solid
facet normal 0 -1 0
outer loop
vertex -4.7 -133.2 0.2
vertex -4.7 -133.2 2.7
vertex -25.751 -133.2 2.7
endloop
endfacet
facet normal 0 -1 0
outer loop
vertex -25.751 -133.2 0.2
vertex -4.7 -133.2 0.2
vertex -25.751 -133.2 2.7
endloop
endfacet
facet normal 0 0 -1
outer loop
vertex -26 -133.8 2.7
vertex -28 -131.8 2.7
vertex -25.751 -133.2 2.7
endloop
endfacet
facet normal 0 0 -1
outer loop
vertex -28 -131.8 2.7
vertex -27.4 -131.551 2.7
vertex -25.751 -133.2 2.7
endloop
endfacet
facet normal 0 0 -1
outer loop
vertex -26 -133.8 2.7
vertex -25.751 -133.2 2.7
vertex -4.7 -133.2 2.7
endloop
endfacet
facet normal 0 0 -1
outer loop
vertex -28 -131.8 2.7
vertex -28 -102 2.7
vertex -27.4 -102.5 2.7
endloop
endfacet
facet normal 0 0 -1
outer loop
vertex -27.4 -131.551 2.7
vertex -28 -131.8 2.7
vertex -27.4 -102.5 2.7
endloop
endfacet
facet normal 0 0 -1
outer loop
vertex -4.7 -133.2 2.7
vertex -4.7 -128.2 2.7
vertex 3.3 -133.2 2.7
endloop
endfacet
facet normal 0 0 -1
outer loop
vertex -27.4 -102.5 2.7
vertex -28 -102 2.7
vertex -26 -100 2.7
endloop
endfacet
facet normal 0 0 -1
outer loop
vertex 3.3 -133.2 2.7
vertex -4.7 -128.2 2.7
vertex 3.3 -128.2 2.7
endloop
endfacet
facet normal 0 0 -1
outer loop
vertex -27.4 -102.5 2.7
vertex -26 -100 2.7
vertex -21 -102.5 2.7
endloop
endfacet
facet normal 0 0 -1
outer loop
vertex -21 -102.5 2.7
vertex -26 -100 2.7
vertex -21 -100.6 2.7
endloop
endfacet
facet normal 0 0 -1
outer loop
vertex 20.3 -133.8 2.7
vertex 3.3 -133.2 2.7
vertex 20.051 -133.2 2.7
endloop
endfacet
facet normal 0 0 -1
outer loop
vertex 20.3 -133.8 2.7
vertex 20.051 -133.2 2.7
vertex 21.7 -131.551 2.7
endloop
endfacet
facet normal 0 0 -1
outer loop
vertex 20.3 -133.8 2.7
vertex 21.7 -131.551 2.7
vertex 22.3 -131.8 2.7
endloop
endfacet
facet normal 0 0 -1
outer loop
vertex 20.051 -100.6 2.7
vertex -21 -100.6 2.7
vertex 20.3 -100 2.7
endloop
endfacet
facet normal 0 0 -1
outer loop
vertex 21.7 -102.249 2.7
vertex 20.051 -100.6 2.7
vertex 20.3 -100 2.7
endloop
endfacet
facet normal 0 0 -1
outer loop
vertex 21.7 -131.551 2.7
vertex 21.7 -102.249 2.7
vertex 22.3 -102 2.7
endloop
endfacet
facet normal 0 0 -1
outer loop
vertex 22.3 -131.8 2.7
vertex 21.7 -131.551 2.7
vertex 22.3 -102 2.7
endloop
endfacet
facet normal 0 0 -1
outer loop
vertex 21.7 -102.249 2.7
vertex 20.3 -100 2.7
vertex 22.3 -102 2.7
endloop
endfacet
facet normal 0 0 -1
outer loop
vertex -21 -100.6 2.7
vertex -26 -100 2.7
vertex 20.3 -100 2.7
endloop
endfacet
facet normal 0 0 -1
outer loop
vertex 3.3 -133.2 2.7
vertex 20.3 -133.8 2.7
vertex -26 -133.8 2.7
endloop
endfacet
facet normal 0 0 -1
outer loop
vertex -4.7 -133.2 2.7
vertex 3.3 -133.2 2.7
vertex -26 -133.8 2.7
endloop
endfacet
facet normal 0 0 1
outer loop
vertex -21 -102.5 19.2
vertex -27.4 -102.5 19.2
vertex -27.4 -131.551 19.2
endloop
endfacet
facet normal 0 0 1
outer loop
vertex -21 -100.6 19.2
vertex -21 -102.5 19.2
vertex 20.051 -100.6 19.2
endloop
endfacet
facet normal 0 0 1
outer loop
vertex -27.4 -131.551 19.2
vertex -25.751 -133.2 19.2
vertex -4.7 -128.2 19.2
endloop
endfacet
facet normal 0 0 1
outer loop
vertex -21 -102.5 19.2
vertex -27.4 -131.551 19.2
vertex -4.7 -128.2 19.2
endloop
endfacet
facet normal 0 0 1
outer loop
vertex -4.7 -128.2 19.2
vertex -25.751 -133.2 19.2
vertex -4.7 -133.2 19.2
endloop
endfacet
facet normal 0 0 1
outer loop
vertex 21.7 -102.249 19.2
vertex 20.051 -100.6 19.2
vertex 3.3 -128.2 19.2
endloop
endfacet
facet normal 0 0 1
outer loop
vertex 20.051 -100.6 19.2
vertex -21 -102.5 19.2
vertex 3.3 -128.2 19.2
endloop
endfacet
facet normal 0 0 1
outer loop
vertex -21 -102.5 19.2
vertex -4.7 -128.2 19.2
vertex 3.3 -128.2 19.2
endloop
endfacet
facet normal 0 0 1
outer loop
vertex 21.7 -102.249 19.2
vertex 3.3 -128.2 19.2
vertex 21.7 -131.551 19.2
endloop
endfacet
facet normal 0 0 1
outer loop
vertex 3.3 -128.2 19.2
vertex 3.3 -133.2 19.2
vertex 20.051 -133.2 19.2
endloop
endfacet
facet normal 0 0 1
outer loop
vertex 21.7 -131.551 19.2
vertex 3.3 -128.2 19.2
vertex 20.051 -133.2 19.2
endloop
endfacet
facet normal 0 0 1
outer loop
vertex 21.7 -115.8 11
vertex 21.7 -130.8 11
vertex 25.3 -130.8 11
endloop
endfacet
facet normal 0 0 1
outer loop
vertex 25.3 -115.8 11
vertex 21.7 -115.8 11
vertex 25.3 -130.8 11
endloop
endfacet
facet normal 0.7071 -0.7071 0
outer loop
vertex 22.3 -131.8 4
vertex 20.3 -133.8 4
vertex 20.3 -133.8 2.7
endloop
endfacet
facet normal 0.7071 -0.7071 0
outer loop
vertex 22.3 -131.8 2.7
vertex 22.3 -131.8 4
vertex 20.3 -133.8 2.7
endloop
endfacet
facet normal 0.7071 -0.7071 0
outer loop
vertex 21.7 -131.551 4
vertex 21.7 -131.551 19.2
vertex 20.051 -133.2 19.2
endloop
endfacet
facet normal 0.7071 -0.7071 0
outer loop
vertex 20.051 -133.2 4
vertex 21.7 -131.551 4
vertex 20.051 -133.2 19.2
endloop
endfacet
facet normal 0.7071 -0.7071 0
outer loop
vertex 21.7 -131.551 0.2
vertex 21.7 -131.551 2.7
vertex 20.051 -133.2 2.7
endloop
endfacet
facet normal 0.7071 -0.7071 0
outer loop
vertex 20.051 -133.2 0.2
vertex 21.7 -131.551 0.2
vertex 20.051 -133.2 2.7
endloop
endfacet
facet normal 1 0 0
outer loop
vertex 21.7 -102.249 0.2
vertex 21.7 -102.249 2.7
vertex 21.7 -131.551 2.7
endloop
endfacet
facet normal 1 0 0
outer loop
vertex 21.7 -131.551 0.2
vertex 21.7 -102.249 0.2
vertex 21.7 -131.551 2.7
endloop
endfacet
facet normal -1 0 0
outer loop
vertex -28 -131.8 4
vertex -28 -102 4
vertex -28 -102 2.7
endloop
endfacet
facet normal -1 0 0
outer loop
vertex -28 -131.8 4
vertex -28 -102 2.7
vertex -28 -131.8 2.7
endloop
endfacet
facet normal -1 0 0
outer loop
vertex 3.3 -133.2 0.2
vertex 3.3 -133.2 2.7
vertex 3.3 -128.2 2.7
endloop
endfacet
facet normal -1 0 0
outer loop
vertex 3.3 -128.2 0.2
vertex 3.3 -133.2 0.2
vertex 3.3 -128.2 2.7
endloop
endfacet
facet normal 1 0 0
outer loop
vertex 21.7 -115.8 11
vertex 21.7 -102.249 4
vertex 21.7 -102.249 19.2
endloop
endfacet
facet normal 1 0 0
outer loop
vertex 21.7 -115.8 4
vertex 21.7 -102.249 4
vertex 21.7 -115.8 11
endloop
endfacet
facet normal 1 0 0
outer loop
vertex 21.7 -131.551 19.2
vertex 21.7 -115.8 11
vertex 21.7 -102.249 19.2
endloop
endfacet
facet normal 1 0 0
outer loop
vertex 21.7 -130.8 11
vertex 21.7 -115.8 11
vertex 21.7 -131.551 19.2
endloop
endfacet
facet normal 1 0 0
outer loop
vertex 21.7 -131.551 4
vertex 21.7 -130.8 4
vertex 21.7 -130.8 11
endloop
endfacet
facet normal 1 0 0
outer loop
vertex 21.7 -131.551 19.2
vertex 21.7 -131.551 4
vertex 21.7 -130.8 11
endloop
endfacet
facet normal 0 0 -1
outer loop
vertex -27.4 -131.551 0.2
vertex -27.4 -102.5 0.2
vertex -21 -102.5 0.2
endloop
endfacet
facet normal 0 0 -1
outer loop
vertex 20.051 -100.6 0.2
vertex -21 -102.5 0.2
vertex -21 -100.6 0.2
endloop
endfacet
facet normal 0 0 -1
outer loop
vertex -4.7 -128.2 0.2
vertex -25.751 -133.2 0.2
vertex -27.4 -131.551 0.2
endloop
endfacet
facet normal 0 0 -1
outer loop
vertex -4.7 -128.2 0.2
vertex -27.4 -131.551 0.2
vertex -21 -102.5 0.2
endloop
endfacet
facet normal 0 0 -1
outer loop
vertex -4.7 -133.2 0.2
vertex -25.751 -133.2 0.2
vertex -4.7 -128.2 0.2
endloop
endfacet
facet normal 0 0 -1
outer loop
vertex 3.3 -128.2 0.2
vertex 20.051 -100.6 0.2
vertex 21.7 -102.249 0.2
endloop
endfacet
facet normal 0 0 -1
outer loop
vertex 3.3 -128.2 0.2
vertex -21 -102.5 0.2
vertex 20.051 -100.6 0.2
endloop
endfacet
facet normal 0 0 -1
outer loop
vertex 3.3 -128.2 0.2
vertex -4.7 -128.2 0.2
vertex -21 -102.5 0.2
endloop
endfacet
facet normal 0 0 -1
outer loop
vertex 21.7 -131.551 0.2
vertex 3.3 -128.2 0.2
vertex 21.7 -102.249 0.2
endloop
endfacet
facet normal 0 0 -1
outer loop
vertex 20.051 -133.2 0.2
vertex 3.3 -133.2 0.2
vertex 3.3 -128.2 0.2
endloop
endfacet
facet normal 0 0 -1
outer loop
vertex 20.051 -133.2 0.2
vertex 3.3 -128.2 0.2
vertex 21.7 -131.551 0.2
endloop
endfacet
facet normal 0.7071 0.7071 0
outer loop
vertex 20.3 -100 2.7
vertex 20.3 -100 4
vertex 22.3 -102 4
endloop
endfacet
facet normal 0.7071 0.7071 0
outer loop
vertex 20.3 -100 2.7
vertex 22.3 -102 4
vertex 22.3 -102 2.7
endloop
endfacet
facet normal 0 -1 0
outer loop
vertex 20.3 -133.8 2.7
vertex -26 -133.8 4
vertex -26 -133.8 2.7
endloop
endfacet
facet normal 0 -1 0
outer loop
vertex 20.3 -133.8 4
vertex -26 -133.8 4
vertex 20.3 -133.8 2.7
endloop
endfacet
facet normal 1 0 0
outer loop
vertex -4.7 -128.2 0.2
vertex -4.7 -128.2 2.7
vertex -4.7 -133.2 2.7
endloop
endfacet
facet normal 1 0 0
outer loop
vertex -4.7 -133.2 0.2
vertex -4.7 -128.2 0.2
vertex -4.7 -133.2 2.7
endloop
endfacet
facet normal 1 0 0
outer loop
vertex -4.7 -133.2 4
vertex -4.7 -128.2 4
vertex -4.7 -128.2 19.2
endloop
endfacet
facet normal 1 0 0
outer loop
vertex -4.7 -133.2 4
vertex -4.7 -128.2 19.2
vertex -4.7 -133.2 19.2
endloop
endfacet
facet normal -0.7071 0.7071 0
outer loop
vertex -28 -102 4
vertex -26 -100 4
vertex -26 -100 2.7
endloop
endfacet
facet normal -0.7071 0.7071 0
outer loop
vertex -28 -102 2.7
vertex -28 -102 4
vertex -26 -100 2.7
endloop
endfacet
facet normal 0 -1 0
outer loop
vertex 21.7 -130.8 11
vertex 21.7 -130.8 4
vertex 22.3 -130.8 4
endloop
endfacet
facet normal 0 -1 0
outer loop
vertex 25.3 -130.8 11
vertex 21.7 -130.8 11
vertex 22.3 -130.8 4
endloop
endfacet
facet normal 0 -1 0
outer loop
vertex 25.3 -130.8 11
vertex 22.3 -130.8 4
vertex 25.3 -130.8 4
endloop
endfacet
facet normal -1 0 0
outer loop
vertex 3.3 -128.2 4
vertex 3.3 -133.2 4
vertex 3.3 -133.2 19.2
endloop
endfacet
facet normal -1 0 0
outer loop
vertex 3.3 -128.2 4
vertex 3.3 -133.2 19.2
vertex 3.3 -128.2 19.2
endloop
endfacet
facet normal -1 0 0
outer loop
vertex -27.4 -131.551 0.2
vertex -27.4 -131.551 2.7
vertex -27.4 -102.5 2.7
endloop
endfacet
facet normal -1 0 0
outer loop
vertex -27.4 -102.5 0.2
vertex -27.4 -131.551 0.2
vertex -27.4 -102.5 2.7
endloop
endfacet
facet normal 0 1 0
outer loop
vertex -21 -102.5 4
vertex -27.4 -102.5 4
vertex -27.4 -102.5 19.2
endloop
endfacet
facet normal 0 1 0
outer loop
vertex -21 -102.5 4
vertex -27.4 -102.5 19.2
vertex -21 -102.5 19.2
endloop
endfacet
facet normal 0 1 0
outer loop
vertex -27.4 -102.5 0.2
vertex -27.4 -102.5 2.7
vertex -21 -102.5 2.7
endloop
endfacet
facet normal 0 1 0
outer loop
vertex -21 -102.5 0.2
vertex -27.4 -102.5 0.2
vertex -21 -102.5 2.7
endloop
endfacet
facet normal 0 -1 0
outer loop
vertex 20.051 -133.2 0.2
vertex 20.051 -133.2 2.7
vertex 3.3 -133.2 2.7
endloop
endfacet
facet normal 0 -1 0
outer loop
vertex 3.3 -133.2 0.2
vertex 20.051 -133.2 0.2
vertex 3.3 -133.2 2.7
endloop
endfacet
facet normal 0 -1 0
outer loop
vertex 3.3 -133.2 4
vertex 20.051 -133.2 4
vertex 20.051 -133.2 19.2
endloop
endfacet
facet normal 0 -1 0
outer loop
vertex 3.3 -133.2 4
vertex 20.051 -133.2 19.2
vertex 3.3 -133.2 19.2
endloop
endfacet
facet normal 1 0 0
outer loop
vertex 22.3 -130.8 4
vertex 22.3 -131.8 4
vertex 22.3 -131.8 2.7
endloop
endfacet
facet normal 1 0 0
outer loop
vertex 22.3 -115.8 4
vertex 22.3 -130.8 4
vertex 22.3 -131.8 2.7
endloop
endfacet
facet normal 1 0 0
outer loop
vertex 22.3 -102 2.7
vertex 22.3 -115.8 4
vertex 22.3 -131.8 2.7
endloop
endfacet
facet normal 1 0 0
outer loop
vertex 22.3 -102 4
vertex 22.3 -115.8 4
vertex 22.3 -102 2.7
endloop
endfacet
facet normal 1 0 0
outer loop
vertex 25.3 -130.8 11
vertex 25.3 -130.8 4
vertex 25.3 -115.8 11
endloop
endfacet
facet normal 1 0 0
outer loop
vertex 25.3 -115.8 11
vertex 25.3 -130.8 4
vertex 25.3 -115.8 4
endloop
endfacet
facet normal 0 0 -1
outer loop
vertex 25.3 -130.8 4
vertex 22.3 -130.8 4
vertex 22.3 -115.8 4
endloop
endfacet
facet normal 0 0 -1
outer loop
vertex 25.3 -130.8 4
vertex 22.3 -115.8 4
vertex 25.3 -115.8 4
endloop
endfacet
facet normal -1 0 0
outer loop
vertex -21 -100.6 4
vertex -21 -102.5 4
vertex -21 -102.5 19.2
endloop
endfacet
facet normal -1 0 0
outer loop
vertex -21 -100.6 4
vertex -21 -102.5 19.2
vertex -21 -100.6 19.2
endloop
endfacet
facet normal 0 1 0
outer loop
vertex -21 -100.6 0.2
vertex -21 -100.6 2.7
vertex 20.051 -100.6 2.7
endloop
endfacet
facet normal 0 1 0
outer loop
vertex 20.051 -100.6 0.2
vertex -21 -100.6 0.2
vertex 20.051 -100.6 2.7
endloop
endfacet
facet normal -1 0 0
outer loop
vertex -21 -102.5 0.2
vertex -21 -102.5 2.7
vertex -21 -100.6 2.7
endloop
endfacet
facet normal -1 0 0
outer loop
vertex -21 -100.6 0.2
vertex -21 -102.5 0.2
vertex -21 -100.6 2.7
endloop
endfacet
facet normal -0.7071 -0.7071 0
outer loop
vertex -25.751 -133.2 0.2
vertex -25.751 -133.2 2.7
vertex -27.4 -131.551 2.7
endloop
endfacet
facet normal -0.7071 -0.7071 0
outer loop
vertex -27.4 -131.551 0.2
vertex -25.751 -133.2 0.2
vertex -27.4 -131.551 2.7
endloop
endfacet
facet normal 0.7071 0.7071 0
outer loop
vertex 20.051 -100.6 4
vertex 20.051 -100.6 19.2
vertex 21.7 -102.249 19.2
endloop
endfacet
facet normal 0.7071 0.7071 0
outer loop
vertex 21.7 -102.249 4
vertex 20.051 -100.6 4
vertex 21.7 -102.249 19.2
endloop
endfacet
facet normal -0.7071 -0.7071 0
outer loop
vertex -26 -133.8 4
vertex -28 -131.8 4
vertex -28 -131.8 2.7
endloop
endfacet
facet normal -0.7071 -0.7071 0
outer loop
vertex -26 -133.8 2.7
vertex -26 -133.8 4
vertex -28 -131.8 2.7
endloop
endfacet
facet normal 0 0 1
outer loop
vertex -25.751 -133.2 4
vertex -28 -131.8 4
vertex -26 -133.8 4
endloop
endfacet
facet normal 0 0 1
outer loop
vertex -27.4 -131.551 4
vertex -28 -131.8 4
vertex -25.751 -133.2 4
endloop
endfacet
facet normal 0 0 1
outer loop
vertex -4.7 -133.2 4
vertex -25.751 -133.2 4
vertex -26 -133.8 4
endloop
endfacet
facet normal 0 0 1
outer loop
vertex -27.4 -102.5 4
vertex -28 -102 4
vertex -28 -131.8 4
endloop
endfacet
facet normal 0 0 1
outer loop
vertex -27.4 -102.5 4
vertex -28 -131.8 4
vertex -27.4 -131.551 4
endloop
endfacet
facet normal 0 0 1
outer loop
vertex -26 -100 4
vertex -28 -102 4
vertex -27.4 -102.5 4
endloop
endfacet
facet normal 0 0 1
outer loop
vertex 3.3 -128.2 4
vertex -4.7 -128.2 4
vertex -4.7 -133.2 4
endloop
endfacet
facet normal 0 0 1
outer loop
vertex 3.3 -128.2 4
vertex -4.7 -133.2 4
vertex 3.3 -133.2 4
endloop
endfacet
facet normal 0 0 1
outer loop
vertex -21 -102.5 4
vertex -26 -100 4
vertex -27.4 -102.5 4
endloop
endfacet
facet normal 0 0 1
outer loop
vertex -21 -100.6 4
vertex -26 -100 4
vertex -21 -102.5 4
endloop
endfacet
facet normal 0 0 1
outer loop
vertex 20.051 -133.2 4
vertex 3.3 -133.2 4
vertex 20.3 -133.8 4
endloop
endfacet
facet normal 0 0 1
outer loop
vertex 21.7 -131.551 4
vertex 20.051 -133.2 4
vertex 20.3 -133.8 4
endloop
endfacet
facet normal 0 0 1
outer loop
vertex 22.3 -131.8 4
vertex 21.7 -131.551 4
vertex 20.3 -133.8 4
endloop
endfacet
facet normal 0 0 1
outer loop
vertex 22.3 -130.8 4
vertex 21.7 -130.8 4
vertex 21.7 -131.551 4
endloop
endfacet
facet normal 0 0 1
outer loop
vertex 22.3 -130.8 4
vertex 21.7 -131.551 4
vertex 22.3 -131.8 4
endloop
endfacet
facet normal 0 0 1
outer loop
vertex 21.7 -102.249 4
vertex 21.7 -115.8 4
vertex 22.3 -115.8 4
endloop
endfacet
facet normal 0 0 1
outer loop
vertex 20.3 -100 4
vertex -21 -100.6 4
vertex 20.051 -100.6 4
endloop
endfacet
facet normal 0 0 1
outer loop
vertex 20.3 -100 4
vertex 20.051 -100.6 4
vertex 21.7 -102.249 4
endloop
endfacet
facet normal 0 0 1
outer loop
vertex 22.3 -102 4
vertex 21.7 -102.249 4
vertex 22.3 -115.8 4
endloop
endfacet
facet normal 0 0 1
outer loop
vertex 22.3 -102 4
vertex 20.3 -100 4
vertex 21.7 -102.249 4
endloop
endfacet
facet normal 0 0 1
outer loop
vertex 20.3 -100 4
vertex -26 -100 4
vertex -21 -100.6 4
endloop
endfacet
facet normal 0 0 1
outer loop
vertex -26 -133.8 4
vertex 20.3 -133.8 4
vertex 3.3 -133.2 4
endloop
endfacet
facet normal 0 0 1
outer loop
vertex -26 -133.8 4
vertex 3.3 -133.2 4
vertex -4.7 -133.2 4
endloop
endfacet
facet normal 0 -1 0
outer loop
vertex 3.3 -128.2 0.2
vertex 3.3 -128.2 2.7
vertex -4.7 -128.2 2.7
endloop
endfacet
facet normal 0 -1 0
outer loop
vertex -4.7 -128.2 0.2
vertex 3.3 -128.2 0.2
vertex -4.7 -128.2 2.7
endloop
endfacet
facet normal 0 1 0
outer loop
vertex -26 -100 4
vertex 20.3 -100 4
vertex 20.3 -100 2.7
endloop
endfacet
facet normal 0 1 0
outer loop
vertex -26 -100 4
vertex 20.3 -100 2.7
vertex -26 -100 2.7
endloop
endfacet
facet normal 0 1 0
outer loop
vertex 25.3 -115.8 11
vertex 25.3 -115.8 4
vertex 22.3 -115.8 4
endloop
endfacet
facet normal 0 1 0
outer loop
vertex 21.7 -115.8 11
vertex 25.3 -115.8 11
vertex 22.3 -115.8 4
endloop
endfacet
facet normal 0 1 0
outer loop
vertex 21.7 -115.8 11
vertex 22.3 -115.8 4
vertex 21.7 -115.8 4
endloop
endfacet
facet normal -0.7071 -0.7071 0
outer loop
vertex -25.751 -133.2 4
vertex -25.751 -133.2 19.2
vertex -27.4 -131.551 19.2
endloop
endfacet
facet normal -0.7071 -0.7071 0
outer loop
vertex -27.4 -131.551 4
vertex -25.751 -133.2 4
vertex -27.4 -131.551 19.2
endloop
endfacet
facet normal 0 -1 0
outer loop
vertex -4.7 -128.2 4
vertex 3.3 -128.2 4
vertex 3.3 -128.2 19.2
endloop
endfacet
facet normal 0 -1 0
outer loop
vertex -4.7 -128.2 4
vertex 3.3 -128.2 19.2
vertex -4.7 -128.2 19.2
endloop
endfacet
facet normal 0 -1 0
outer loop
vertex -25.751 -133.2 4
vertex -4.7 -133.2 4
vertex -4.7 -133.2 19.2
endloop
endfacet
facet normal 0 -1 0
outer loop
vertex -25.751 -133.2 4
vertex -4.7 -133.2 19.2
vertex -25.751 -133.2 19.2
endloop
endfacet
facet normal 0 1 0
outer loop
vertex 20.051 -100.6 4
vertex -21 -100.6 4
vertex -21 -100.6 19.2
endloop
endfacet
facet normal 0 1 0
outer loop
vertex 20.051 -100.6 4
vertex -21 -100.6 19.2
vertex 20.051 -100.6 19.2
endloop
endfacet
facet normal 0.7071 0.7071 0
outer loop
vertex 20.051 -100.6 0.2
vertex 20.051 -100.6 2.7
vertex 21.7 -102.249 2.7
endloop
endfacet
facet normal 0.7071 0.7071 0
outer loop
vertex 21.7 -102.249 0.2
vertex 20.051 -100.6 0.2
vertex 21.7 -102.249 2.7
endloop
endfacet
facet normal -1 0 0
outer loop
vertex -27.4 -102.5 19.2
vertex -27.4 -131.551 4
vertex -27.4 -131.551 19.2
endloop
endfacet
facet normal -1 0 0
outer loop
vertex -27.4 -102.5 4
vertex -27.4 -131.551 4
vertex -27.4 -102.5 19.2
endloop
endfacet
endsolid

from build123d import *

# Parameters (mm, degrees)
F0_W          = 11
F0_H          = 15
F1_DEPTH      = 1.3
F0_W_2        = 3
F2_DEPTH      = 7
F3_SIZE       = 2
F5_DEPTH      = 2.5
F5_DEPTH_BACK = 16.5


with BuildPart() as f1:
    # F0 (on Top) → F1 (new body)
    with BuildSketch(Plane.XY):
        Polygon((22.3, -115.8), (22.3, -100), (-28, -100), (-28, -133.8), (22.3, -133.8), (22.3, -130.8), (11.3, -130.8), (11.3, -115.8), align=None)
        with Locations((16.8, -123.3)):
            Rectangle(F0_W, F0_H)
    extrude(amount=-F1_DEPTH)

    # F0 (on Top) → F2 (join)
    with BuildSketch(Plane.XY):
        with Locations((23.8, -123.3)):
            Rectangle(F0_W_2, F0_H)
        with Locations((16.8, -123.3)):
            Rectangle(F0_W, F0_H)
    extrude(amount=F2_DEPTH)

    # F3
    f3_edges = [f1.edges().sort_by_distance(p)[0] for p in [
        (22.3, -133.8, -0.65),
        (-28, -133.8, -0.65),
        (22.3, -100, -0.65),
        (-28, -100, -0.65),
    ]]
    chamfer(f3_edges, length=F3_SIZE)

    # F4 (on face) → F5 (join, two sides)
    with BuildSketch(Plane(origin=(0, 0, -1.3), x_dir=(1, 0, 0), z_dir=(0, 0, -1))) as f5_sk:
        Polygon((-25.751472, 133.2), (-27.4, 131.551472), (-27.4, 102.5), (-21, 102.5), (-21, 100.6), (20.051472, 100.6), (21.7, 102.248528), (21.7, 131.551472), (20.051472, 133.2), (3.3, 133.2), (3.3, 128.2), (-4.7, 128.2), (-4.7, 133.2), align=None)
    extrude(amount=F5_DEPTH)
    extrude(f5_sk.sketch, amount=-F5_DEPTH_BACK)


with BuildPart() as f1_1:
    # F6: moved
    add(f1.part.moved(Location((0, 0, 4))))


solid = f1_1.part
